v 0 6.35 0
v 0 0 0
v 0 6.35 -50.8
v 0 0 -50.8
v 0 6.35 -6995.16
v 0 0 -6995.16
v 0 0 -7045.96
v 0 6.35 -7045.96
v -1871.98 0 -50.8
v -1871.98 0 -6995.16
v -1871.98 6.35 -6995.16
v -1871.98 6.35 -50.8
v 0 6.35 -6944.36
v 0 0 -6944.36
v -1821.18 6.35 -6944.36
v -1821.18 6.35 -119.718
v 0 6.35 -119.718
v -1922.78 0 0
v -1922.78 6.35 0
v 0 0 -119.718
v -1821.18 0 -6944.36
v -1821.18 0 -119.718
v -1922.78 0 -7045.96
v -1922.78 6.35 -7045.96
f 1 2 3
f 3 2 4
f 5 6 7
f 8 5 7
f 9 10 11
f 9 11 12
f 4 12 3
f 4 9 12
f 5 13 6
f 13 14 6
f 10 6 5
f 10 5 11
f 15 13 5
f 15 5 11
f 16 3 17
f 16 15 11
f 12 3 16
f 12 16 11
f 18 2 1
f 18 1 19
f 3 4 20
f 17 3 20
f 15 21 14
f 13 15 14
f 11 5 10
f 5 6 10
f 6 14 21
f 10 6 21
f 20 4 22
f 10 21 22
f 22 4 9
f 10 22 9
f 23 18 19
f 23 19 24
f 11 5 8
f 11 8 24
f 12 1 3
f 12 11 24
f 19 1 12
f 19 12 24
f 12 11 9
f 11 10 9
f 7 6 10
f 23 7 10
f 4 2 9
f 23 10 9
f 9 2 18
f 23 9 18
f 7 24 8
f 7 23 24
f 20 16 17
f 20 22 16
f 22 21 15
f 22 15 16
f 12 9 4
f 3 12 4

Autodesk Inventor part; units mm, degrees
ref_plane "YZ Plane" through (0, 0, 0) normal (1, 0, 0) x (0, 1, 0)
ref_plane "XZ Plane" through (0, 0, 0) normal (0, 1, 0) x (-1, 0, 0)
ref_plane "XY Plane" through (0, 0, 0) normal (0, 0, 1) x (1, 0, 0)
sketch "Sketch1" plane through (0, 0, 0) normal (0, 1, 0) x (-1, 0, 0)
  line L0 (0, 0) -> (1922.78, 0)
  line L1 (1922.78, 0) -> (1922.78, -7045.96)
  line L2 (1922.78, -7045.96) -> (0, -7045.96)
  line L3 (0, -6995.16) -> (1871.98, -6995.16)
  line L4 (1871.98, -6995.16) -> (1871.98, -50.8)
  line L5 (1871.98, -50.8) -> (0, -50.8)
  line L6 (0, 0) -> (0, -50.8)
  line L7 (0, -6995.16) -> (0, -7045.96)
  line L8 (1821.18, -6944.36) -> (0, -6944.36)
  line L9 (1821.18, -6944.36) -> (1821.18, -119.7177)
  line L10 (0, -6944.36) -> (0, -6995.16)
  line L11 (1821.18, -119.7177) -> (0, -119.7177)
  line L12 (0, -50.8) -> (0, -119.7177)
  dimension "d0" = 1922.78
  dimension "d1" = 7045.96
  dimension "d2" = 1922.78
  dimension "d3" = 50.8
  dimension "d6" = 50.8
  dimension "d7" = 50.8
extrude "Extrusion1" add sketch "Sketch1" along normal blind 6.35 contours L0 L1 L2 L7 L3 L4 L5 L6
extrude "Extrusion2" add sketch "Sketch1" along normal blind 6.35 separate body contours L5 L4 L3 L10 L8 L9 L11 L12
equation "\"d0\" = d2"
properties part number "Trim_Blue"
